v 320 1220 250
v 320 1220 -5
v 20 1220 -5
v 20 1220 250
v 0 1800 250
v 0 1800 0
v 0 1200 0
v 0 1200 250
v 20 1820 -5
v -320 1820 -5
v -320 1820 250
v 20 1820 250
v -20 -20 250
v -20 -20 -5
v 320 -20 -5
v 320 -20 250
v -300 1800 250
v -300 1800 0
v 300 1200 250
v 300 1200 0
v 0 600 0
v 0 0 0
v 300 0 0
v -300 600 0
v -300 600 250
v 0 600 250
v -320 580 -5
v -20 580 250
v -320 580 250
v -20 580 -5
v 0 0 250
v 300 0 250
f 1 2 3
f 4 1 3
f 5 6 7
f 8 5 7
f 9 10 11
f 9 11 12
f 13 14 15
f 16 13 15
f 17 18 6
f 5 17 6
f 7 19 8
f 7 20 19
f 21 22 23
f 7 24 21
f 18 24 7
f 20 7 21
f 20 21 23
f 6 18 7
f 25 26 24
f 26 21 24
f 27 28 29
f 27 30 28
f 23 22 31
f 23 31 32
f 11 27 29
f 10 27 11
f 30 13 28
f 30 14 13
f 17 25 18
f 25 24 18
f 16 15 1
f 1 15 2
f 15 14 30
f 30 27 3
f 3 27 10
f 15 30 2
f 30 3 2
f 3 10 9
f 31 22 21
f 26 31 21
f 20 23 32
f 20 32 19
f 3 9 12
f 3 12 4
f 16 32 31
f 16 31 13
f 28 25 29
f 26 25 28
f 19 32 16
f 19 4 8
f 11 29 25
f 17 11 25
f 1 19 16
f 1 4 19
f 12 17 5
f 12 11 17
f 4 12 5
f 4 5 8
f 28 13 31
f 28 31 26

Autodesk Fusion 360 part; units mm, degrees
sketch "Sketch1" plane through (0, 0, 0) normal (0, 0, 1) x (1, 0, 0)
  line L0 (0, 0) -> (300, 0)
  line L1 (300, 0) -> (300, 1200)
  line L2 (300, 1200) -> (0, 1200)
  line L3 (0, 600) -> (-300, 600)
  line L4 (-300, 600) -> (-300, 1800)
  line L5 (-300, 1800) -> (0, 1800)
  line L6 (0, 1800) -> (0, 1200)
  line L7 (0, 0) -> (0, 600)
  line L8 (20, 1820) -> (20, 1220)
  line L9 (320, 1220) -> (20, 1220)
  line L10 (320, -20) -> (320, 1220)
  line L11 (-20, -20) -> (320, -20)
  line L12 (-20, -20) -> (-20, 580)
  line L13 (-20, 580) -> (-320, 580)
  line L14 (-320, 580) -> (-320, 1820)
  line L15 (-320, 1820) -> (20, 1820)
  dimension "d1" = 300
  dimension "d2" = 1200
  dimension "d3" = 300
  dimension "d4" = 1200
  dimension "d5" = -20
extrude "Extrude1" add sketch "Sketch1" along normal blind 400 makes body 1
extrude "Extrude2" add sketch "Sketch1" against normal blind 5 separate body contours L0 L1 L2 L3 L4 L5 L6 L7 makes body 2
extrude "Extrude3" add sketch "Sketch1" against normal blind 5 bodies 1 2
extrude "Extrude4" cut 1 faces at (-313.3333, 1400, 400) along direction (0, 0, -1) blind 100 on bodies 1 bodies 1
extrude "Extrude5" cut 1 faces at (-313.3333, 1400, 300) along direction (0, 0, -1) blind 50 on bodies 1 bodies 1
